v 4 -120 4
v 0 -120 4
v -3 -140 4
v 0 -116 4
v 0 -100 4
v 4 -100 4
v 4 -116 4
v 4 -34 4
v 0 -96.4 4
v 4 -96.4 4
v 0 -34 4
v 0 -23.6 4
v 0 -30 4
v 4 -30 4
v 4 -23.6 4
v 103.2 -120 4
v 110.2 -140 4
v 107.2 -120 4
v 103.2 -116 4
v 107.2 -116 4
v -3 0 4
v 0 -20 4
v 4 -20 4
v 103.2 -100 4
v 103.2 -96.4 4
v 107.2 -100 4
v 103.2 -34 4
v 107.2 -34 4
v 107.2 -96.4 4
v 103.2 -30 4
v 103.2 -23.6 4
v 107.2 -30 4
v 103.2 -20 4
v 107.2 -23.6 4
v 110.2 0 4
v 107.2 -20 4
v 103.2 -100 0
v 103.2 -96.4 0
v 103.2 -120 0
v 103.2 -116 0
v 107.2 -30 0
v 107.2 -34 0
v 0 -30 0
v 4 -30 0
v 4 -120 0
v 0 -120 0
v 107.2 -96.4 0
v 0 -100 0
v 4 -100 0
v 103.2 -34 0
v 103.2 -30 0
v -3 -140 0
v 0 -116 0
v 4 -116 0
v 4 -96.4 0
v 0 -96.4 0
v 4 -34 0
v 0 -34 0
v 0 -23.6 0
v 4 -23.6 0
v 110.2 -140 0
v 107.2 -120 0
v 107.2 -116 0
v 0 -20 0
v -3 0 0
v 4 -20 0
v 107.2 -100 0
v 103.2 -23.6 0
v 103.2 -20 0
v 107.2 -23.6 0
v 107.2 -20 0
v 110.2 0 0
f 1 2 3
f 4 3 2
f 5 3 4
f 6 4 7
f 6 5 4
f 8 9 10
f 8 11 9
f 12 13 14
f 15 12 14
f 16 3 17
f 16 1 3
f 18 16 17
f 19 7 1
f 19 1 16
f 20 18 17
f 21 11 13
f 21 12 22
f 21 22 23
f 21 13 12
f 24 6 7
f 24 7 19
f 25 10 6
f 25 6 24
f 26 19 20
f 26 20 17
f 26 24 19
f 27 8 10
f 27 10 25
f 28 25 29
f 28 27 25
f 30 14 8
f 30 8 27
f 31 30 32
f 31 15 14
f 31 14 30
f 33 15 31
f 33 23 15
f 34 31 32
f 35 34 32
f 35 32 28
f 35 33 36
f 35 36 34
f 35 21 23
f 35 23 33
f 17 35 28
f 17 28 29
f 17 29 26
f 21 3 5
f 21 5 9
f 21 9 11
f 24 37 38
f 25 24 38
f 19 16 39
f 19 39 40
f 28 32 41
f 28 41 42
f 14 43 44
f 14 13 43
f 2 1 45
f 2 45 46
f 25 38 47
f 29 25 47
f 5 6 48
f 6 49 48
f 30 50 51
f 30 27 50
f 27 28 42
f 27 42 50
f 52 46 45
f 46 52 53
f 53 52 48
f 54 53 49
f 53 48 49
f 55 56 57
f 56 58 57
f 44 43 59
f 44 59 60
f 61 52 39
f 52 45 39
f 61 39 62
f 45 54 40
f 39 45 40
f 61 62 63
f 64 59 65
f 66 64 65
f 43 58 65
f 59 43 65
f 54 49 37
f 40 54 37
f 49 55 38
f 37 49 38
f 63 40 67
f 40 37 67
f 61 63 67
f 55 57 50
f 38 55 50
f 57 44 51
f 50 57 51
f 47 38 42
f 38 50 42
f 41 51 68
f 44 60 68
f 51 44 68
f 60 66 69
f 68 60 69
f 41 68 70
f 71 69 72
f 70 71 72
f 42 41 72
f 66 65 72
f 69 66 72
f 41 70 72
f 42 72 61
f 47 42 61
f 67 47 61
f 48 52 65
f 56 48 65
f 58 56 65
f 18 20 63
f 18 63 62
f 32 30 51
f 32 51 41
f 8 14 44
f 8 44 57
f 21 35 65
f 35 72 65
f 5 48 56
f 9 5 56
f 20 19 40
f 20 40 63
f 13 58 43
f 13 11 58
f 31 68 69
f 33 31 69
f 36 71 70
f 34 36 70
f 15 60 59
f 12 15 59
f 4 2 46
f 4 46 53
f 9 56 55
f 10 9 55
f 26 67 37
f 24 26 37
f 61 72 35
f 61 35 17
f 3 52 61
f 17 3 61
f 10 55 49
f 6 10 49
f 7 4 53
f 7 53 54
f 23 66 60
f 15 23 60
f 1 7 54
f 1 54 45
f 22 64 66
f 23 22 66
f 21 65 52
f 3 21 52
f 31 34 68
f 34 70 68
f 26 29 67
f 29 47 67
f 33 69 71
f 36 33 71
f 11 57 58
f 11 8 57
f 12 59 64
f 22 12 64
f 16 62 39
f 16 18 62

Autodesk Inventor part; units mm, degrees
ref_plane "YZ Plane" through (0, 0, 0) normal (1, 0, 0) x (0, 1, 0)
ref_plane "XZ Plane" through (0, 0, 0) normal (0, 1, 0) x (-1, 0, 0)
sketch "Sketch1" plane through (0, 0, 0) normal (0, 0, 1) x (1, 0, 0)
  line L0 (0, -20) -> (0, 0)
  line L1 (0, -96.4) -> (0, -23.6)
  line L2 (4, -23.6) -> (0, -23.6)
  line L3 (0, -20) -> (4, -20)
  line L4 (4, 0) -> (0, 0)
  line L5 (0, -140) -> (0, -100)
  line L6 (0, -96.4) -> (4, -96.4)
  line L7 (4, -100) -> (0, -100)
  line L8 (4, -140) -> (0, -140)
  line L9 (107.2, -23.6) -> (107.2, -96.4)
  line L10 (107.2, -100) -> (107.2, -140)
  line L11 (107.2, -100) -> (103.2, -100)
  line L12 (103.2, -96.4) -> (107.2, -96.4)
  line L13 (103.2, -140) -> (107.2, -140)
  line L14 (103.2, -20) -> (107.2, -20)
  line L15 (107.2, 0) -> (107.2, -20)
  line L16 (103.2, 0) -> (107.2, 0)
  line L17 (4, 0) -> (103.2, 0)
  line L18 (4, -140) -> (103.2, -140)
  line L19 (0, -20) -> (4, -20)
  line L20 (4, -20) -> (4, -23.6)
  line L21 (4, -23.6) -> (0, -23.6)
  line L22 (0, -23.6) -> (0, -20)
  line L23 (0, -96.4) -> (4, -96.4)
  line L24 (4, -96.4) -> (4, -100)
  line L25 (4, -100) -> (0, -100)
  line L26 (0, -100) -> (0, -96.4)
  line L27 (103.2, -96.4) -> (107.2, -96.4)
  line L28 (107.2, -96.4) -> (107.2, -100)
  line L29 (107.2, -100) -> (103.2, -100)
  line L30 (103.2, -100) -> (103.2, -96.4)
  line L31 (103.2, -20) -> (107.2, -20)
  line L32 (107.2, -20) -> (107.2, -23.6)
  line L33 (107.2, -23.6) -> (103.2, -23.6)
  line L34 (103.2, -23.6) -> (103.2, -20)
  line L35 (0, 0) -> (-3, 0)
  line L36 (-3, 0) -> (-3, -140)
  line L37 (-3, -140) -> (0, -140)
  line L38 (0, -140) -> (0, 0)
  line L39 (107.2, 0) -> (110.2, 0)
  line L40 (110.2, 0) -> (110.2, -140)
  line L41 (110.2, -140) -> (107.2, -140)
  line L42 (107.2, -140) -> (107.2, 0)
  point P0 (0, 0)
  dimension "d0" = 3
  dimension "d1" = 3
extrude "Extrusion1" add sketch "Sketch1" along normal blind 4 contours L22 L1 L26 L5 L37 L36 L35 L0 | L0 L4 L17 L16 L15 L14 L34 L33 L9 L12 L30 L11 L10 L13 L18 L8 L5 L7 L24 L6 L1 L2 L20 L3 | L39 L40 L41 L10 L28 L9 L32 L15
sketch "Sketch2" plane through (0, 0, 4) normal (0, 0, 1) x (1, 0, 0)
  line L0 (107.2, -20) -> (107.2, -23.6) projected
  line L1 (107.2, -23.6) -> (103.2, -23.6) projected
  line L2 (103.2, -23.6) -> (103.2, -20) projected
  line L3 (103.2, -20) -> (107.2, -20) projected
  line L4 (107.2, -96.4) -> (107.2, -100) projected
  line L5 (107.2, -100) -> (103.2, -100) projected
  line L6 (103.2, -100) -> (103.2, -96.4) projected
  line L7 (103.2, -96.4) -> (107.2, -96.4) projected
  line L8 (0, -96.4) -> (4, -96.4) projected
  line L9 (4, -96.4) -> (4, -100) projected
  line L10 (4, -100) -> (0, -100) projected
  line L11 (0, -100) -> (0, -96.4) projected
  line L12 (0, -23.6) -> (0, -20) projected
  line L13 (0, -20) -> (4, -20) projected
  line L14 (4, -20) -> (4, -23.6) projected
  line L15 (4, -23.6) -> (0, -23.6) projected
  line L16 (110.2, 0) -> (-3, 0) projected
  line L17 (-3, 0) -> (-3, -140) projected
  line L18 (-3, -140) -> (110.2, -140) projected
  line L19 (110.2, -140) -> (110.2, 0) projected
  line L20 (107.2, -120) -> (103.2, -120)
  line L21 (103.2, -120) -> (103.2, -116)
  line L22 (103.2, -116) -> (107.2, -116)
  line L23 (107.2, -116) -> (107.2, -120)
  line L24 (107.2, -120) -> (103.2, -116) construction
  line L25 (103.2, -120) -> (107.2, -116) construction
  line L26 (107.2, -34) -> (103.2, -34)
  line L27 (103.2, -34) -> (103.2, -30)
  line L28 (103.2, -30) -> (107.2, -30)
  line L29 (107.2, -30) -> (107.2, -34)
  line L30 (107.2, -34) -> (103.2, -30) construction
  line L31 (103.2, -34) -> (107.2, -30) construction
  point P0 (0, 0)
  point P1 (105.2, -118)
  point P2 (105.2, -32)
  dimension "d4" = 4
  dimension "d5" = 20
  dimension "d6" = 4
  dimension "d7" = 4
  dimension "d8" = 30
extrude "Extrusion2" cut sketch "Sketch2" against normal blind 10 contours L20 L21 L22 L23 | L26 L27 L28 L29
ref_plane "Work Plane1" through (53.6, -140, 0) normal (1, 0, 0) x (0, 0, -1)
mirror "Mirror1" about plane through (53.6, -140, 0) normal (1, 0, 0) of "Extrusion2"
properties part number "P3"
